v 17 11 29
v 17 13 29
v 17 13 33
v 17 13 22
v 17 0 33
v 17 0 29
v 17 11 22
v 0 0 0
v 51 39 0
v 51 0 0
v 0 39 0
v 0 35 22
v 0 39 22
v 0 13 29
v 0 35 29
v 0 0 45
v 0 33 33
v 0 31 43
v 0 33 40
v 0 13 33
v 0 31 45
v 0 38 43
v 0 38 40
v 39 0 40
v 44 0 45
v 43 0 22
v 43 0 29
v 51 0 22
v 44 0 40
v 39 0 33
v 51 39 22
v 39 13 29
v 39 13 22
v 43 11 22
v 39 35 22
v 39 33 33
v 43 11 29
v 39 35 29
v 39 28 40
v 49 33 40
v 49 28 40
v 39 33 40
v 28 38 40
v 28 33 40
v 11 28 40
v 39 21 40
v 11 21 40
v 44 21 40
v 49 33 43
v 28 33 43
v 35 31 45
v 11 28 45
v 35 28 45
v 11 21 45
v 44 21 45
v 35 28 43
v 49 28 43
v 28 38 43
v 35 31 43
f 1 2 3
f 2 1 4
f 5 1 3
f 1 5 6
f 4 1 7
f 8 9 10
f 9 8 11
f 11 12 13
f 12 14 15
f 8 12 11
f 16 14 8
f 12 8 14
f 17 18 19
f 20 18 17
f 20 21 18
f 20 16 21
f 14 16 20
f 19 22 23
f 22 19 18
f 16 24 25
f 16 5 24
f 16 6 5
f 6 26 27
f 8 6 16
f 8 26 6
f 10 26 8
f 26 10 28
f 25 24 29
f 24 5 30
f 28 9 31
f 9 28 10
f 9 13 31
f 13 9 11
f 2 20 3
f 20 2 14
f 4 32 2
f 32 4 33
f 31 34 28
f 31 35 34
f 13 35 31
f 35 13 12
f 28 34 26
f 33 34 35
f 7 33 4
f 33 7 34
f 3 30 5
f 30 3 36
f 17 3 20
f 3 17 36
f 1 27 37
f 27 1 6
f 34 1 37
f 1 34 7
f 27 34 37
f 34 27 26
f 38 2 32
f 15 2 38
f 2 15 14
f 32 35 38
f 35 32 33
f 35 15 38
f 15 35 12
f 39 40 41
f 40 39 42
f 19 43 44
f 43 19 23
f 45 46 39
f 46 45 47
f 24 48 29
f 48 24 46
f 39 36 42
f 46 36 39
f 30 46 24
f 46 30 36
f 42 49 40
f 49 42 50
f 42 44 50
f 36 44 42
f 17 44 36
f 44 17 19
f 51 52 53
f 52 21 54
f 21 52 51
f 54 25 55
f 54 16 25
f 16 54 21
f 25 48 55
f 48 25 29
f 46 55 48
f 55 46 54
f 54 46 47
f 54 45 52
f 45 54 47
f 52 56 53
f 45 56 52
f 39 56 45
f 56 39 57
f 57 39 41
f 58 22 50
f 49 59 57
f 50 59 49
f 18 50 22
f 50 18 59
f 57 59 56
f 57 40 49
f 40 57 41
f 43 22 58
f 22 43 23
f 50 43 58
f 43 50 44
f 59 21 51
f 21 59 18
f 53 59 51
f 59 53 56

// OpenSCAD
translate([8.5, 6.5, 5.5]) color([0.9545082818366412, 0.02538948740661906, 0.39264862168779513]) cube([17, 13, 11], center=true);
translate([25.5, 6.5, 5.5]) color([0.12527064222330164, 0.9928151500577586, 0.6355716010561779]) cube([17, 13, 11], center=true);
translate([42.5, 6.5, 5.5]) color([0.40641678624517696, 0.1421319514189895, 0.14748951348813844]) cube([17, 13, 11], center=true);
translate([8.5, 19.5, 5.5]) color([0.8666090764559645, 0.5114920143771782, 0.16291179601388028]) cube([17, 13, 11], center=true);
translate([25.5, 19.5, 5.5]) color([0.8928293074217152, 0.9106207302279238, 0.7053130391381187]) cube([17, 13, 11], center=true);
translate([42.5, 19.5, 5.5]) color([0.7162737307255599, 0.7235742512845528, 0.7298089625221481]) cube([17, 13, 11], center=true);
translate([8.5, 32.5, 5.5]) color([0.5196081403156461, 0.823493134639761, 0.6911885197769689]) cube([17, 13, 11], center=true);
translate([25.5, 32.5, 5.5]) color([0.6973164426626367, 0.38726457915960755, 0.18022138882203653]) cube([17, 13, 11], center=true);
translate([42.5, 32.5, 5.5]) color([0.8001465394041192, 0.8129994204848935, 0.08072942167368968]) cube([17, 13, 11], center=true);
translate([8.5, 6.5, 16.5]) color([0.17442535469903642, 0.26558344961408153, 0.8002006207478382]) cube([17, 13, 11], center=true);
translate([25.5, 6.5, 16.5]) color([0.3279381595582189, 0.7086727191051987, 0.7823295314553788]) cube([17, 13, 11], center=true);
translate([42.5, 6.5, 16.5]) color([0.5174360046946651, 0.45647885649310815, 0.9099967640280606]) cube([17, 13, 11], center=true);
translate([8.5, 19.5, 16.5]) color([0.7566722996545016, 0.44882496858184395, 0.15281911968142636]) cube([17, 13, 11], center=true);
translate([25.5, 19.5, 16.5]) color([0.6325441046469116, 0.1769660088535372, 0.5122224095001495]) cube([17, 13, 11], center=true);
translate([42.5, 19.5, 16.5]) color([0.8959696721858674, 0.31608020378500323, 0.9467436825606468]) cube([17, 13, 11], center=true);
translate([8.5, 32.5, 16.5]) color([0.1928870204716916, 0.7910187054913302, 0.6108926701450443]) cube([17, 13, 11], center=true);
translate([25.5, 32.5, 16.5]) color([0.8122678209742187, 0.5222627979471512, 0.7095307583634994]) cube([17, 13, 11], center=true);
translate([42.5, 32.5, 16.5]) color([0.9126687247694082, 0.13487625477079712, 0.7715208720856912]) cube([17, 13, 11], center=true);
translate([8.5, 6.5, 27.5]) color([0.05716454642595936, 0.08241654053773162, 0.5176706786705761]) cube([17, 13, 11], center=true);
translate([23.5, 5.5, 25.5]) color([0.0024604932439482585, 0.774865046739482, 0.10398133417765076]) cube([13, 11, 7], center=true);
translate([36.5, 5.5, 25.5]) color([0.6075408633971222, 0.5702741924791085, 0.335807396721168]) cube([13, 11, 7], center=true);
translate([6.5, 18.5, 25.5]) color([0.3780654483467295, 0.36205489178930694, 0.8413126085807436]) cube([13, 11, 7], center=true);
translate([19.5, 18.5, 25.5]) color([0.6365683683667089, 0.13610848275491239, 0.9255182446742467]) cube([13, 11, 7], center=true);
translate([32.5, 18.5, 25.5]) color([0.18259927432055334, 0.12509989752770068, 0.33788945440902196]) cube([13, 11, 7], center=true);
translate([6.5, 29.5, 25.5]) color([0.607477949510089, 0.04413950751599882, 0.6453929548117466]) cube([13, 11, 7], center=true);
translate([19.5, 29.5, 25.5]) color([0.6988419541065013, 0.7967664255910738, 0.9116718921976609]) cube([13, 11, 7], center=true);
translate([32.5, 29.5, 25.5]) color([0.600448770579328, 0.7944487907838055, 0.1681613799771936]) cube([13, 11, 7], center=true);
translate([6.5, 5.5, 36.5]) color([0.9183995562433641, 0.9268586566852167, 0.40822611044352053]) cube([13, 11, 7], center=true);
translate([19.5, 5.5, 36.5]) color([0.4407066729290805, 0.6041418306666712, 0.6201352905963935]) cube([13, 11, 7], center=true);
translate([32.5, 5.5, 36.5]) color([0.25582819932935885, 0.3097428572381714, 0.8490920052212889]) cube([13, 11, 7], center=true);
translate([6.5, 16.5, 36.5]) color([0.453637908490201, 0.18066627555108494, 0.4537290543496928]) cube([13, 11, 7], center=true);
translate([19.5, 16.5, 36.5]) color([0.2641493990309046, 0.9492851375614021, 0.06409274308092405]) cube([13, 11, 7], center=true);
translate([32.5, 16.5, 36.5]) color([0.09630522223834415, 0.02618666999626429, 0.02133712304448243]) cube([13, 11, 7], center=true);
translate([6.5, 27.5, 36.5]) color([0.40376331371079255, 0.6905719463038024, 0.8969992176715027]) cube([13, 11, 7], center=true);
translate([19.5, 27.5, 36.5]) color([0.32280326974746465, 0.790755737975632, 0.7460115169857665]) cube([13, 11, 7], center=true);
translate([32.5, 27.5, 36.5]) color([0.6948475129606672, 0.47653257906772517, 0.8579766307154586]) cube([13, 11, 7], center=true);
translate([5.5, 3.5, 42.5]) color([0.5356136848189613, 0.4019331618452773, 0.783713898498177]) cube([11, 7, 5], center=true);
translate([16.5, 3.5, 42.5]) color([0.9254696984756191, 0.0277966234683793, 0.5158650286176655]) cube([11, 7, 5], center=true);
translate([27.5, 3.5, 42.5]) color([0.8365998776746773, 0.08009244005093674, 0.35854963179787425]) cube([11, 7, 5], center=true);
translate([38.5, 3.5, 42.5]) color([0.0984859129144442, 0.9681463616569913, 0.1542718478221884]) cube([11, 7, 5], center=true);
translate([5.5, 10.5, 42.5]) color([0.5165971564168642, 0.8047430089643692, 0.9598305824160865]) cube([11, 7, 5], center=true);
translate([16.5, 10.5, 42.5]) color([0.0007265089205383823, 0.33769105491683293, 0.9444140087685011]) cube([11, 7, 5], center=true);
translate([27.5, 10.5, 42.5]) color([0.6959768172121321, 0.16055826227824588, 0.7793255516951493]) cube([11, 7, 5], center=true);
translate([38.5, 10.5, 42.5]) color([0.1589752259859445, 0.6798370424105331, 0.9431536263145228]) cube([11, 7, 5], center=true);
translate([5.5, 17.5, 42.5]) color([0.9341404857092784, 0.32827049453258017, 0.023848105094706917]) cube([11, 7, 5], center=true);
translate([16.5, 17.5, 42.5]) color([0.9585798448912861, 0.6258377632382796, 0.3981042954636257]) cube([11, 7, 5], center=true);
translate([27.5, 17.5, 42.5]) color([0.2264255750200933, 0.6356717667101055, 0.328569085672622]) cube([11, 7, 5], center=true);
translate([38.5, 17.5, 42.5]) color([0.9662245753272395, 0.3520821722301851, 0.16362135021644642]) cube([11, 7, 5], center=true);
translate([5.5, 24.5, 42.5]) color([0.42074777530803376, 0.36328644213461747, 0.5653807754665455]) cube([11, 7, 5], center=true);
translate([3.5, 30.5, 41.5]) color([0.3865100485452896, 0.7707594112565195, 0.16214085318372695]) cube([7, 5, 3], center=true);
translate([10.5, 30.5, 41.5]) color([0.5836514905515098, 0.6869400768720183, 0.718467099976435]) cube([7, 5, 3], center=true);
translate([17.5, 30.5, 41.5]) color([0.17196229100139104, 0.14887881293527583, 0.025166107893626943]) cube([7, 5, 3], center=true);
translate([24.5, 30.5, 41.5]) color([0.32332346968418324, 0.003696799562737496, 0.04720529747843194]) cube([7, 5, 3], center=true);
translate([31.5, 30.5, 41.5]) color([0.9255571895234466, 0.573001262631075, 0.14769469781462263]) cube([7, 5, 3], center=true);
translate([38.5, 30.5, 41.5]) color([0.15315209085934545, 0.7868491215994531, 0.7877029182496789]) cube([7, 5, 3], center=true);
translate([45.5, 30.5, 41.5]) color([0.4187372508366701, 0.5680438273675328, 0.6864311496386182]) cube([7, 5, 3], center=true);
translate([3.5, 35.5, 41.5]) color([0.7112052310106062, 0.9225367392437966, 0.36402675889620517]) cube([7, 5, 3], center=true);
translate([10.5, 35.5, 41.5]) color([0.21666285047939615, 0.40038769746607716, 0.12979762559949215]) cube([7, 5, 3], center=true);
translate([17.5, 35.5, 41.5]) color([0.5661089096865166, 0.350592866287013, 0.09655676358596321]) cube([7, 5, 3], center=true);
translate([24.5, 35.5, 41.5]) color([0.8957043173613797, 0.24564542972396286, 0.3817592950540295]) cube([7, 5, 3], center=true);
translate([2.5, 29.5, 44.0]) color([0.9163373365613642, 0.24005472395766314, 0.4811830401201487]) cube([5, 3, 2], center=true);
translate([7.5, 29.5, 44.0]) color([0.9204180358452778, 0.06901768472479497, 0.25236871091997304]) cube([5, 3, 2], center=true);
translate([12.5, 29.5, 44.0]) color([0.2758752397078251, 0.526585946767007, 0.5423400552699501]) cube([5, 3, 2], center=true);
translate([17.5, 29.5, 44.0]) color([0.6040332809955223, 0.7795947303962014, 0.8767515811101877]) cube([5, 3, 2], center=true);
translate([22.5, 29.5, 44.0]) color([0.27628184885013174, 0.6109665581700968, 0.8673330381368943]) cube([5, 3, 2], center=true);
translate([27.5, 29.5, 44.0]) color([0.39077563557117434, 0.6261021875341246, 0.5344719952169016]) cube([5, 3, 2], center=true);
translate([32.5, 29.5, 44.0]) color([0.8525626141482417, 0.1442072370162294, 0.39242938925918713]) cube([5, 3, 2], center=true);
